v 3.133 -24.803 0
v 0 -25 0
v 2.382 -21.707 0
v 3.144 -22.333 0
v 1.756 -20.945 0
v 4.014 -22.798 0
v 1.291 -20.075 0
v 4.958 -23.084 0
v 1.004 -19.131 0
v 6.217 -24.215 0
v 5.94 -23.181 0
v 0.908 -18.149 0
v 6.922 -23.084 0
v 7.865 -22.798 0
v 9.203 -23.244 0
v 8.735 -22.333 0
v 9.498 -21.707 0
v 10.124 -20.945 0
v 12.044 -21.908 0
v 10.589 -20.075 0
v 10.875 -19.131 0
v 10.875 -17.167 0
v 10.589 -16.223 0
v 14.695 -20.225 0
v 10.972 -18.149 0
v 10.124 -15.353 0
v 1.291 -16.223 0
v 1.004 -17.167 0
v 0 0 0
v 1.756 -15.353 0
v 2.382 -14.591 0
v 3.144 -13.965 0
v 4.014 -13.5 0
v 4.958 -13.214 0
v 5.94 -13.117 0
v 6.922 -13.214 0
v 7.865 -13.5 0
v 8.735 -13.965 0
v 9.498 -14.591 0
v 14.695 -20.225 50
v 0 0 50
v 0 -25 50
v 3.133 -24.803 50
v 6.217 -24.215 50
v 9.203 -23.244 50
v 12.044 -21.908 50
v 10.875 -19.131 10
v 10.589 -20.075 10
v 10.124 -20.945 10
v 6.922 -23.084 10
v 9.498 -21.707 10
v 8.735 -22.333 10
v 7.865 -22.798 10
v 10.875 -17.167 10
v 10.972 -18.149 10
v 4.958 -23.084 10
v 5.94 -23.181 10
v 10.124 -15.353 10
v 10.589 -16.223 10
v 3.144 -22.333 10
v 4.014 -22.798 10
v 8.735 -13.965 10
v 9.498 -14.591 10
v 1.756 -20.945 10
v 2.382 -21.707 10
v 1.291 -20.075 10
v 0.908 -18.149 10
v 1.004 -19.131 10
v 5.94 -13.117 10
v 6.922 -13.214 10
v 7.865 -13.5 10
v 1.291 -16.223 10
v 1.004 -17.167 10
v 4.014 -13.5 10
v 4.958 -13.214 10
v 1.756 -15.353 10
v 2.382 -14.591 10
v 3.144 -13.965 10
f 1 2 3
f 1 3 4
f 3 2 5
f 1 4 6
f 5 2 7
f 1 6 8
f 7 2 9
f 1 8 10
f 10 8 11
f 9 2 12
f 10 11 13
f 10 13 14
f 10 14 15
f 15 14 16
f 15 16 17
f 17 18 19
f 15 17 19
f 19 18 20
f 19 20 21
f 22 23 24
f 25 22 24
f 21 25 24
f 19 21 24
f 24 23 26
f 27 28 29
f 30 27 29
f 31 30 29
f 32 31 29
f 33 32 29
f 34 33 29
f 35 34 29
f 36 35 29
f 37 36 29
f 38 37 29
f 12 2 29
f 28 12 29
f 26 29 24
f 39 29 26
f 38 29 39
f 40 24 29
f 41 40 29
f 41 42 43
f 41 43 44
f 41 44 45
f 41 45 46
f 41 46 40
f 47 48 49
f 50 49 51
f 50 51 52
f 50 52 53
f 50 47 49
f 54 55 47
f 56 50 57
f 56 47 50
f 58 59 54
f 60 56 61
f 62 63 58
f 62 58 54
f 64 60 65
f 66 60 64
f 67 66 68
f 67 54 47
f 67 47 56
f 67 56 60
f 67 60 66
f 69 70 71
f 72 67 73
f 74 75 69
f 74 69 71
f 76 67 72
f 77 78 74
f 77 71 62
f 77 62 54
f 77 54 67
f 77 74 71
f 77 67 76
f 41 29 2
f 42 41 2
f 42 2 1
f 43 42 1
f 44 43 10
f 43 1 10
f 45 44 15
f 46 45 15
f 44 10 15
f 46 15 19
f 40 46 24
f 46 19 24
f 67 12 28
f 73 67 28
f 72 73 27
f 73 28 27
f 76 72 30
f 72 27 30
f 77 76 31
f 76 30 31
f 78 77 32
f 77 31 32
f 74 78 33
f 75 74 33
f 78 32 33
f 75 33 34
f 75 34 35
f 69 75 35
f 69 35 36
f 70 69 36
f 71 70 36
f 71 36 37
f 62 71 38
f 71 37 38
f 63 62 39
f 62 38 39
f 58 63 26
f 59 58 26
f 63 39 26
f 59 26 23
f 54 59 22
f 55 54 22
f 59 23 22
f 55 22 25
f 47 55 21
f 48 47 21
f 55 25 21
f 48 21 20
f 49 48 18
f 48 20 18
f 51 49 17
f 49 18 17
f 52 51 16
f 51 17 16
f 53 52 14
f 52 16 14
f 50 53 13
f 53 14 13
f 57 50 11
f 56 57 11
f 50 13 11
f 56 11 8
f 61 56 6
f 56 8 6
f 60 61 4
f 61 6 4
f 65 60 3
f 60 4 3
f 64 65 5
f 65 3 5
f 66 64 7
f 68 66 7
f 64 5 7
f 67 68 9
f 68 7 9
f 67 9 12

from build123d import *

# Parameters (mm, degrees)
SALIENTE_EXTRUIR1_DEPTH = 50
CROQUIS2_R              = 5.032013792
CORTAR_EXTRUIR1_DEPTH   = 10


with BuildPart() as part:
    # Croquis1 → Saliente-Extruir1 (new body)
    with BuildSketch(Plane.XY):
        with BuildLine():
            Line((0, 0), (0, -25))
            ThreePointArc((0, -25), (7.725424859, -23.776412907), (14.694631307, -20.225424859))
            Line((14.694631307, -20.225424859), (0, 0))
        make_face()
    extrude(amount=SALIENTE_EXTRUIR1_DEPTH)

    # Croquis2 → Cortar-Extruir1 (cut)
    with BuildSketch(Plane(origin=(0, 0, 0), x_dir=(-1, 0, 0), z_dir=(0, 0, -1))):
        with Locations((-5.939812616, -18.149032461)):
            Circle(CROQUIS2_R)
    extrude(amount=-CORTAR_EXTRUIR1_DEPTH, mode=Mode.SUBTRACT)


solid = part.part
